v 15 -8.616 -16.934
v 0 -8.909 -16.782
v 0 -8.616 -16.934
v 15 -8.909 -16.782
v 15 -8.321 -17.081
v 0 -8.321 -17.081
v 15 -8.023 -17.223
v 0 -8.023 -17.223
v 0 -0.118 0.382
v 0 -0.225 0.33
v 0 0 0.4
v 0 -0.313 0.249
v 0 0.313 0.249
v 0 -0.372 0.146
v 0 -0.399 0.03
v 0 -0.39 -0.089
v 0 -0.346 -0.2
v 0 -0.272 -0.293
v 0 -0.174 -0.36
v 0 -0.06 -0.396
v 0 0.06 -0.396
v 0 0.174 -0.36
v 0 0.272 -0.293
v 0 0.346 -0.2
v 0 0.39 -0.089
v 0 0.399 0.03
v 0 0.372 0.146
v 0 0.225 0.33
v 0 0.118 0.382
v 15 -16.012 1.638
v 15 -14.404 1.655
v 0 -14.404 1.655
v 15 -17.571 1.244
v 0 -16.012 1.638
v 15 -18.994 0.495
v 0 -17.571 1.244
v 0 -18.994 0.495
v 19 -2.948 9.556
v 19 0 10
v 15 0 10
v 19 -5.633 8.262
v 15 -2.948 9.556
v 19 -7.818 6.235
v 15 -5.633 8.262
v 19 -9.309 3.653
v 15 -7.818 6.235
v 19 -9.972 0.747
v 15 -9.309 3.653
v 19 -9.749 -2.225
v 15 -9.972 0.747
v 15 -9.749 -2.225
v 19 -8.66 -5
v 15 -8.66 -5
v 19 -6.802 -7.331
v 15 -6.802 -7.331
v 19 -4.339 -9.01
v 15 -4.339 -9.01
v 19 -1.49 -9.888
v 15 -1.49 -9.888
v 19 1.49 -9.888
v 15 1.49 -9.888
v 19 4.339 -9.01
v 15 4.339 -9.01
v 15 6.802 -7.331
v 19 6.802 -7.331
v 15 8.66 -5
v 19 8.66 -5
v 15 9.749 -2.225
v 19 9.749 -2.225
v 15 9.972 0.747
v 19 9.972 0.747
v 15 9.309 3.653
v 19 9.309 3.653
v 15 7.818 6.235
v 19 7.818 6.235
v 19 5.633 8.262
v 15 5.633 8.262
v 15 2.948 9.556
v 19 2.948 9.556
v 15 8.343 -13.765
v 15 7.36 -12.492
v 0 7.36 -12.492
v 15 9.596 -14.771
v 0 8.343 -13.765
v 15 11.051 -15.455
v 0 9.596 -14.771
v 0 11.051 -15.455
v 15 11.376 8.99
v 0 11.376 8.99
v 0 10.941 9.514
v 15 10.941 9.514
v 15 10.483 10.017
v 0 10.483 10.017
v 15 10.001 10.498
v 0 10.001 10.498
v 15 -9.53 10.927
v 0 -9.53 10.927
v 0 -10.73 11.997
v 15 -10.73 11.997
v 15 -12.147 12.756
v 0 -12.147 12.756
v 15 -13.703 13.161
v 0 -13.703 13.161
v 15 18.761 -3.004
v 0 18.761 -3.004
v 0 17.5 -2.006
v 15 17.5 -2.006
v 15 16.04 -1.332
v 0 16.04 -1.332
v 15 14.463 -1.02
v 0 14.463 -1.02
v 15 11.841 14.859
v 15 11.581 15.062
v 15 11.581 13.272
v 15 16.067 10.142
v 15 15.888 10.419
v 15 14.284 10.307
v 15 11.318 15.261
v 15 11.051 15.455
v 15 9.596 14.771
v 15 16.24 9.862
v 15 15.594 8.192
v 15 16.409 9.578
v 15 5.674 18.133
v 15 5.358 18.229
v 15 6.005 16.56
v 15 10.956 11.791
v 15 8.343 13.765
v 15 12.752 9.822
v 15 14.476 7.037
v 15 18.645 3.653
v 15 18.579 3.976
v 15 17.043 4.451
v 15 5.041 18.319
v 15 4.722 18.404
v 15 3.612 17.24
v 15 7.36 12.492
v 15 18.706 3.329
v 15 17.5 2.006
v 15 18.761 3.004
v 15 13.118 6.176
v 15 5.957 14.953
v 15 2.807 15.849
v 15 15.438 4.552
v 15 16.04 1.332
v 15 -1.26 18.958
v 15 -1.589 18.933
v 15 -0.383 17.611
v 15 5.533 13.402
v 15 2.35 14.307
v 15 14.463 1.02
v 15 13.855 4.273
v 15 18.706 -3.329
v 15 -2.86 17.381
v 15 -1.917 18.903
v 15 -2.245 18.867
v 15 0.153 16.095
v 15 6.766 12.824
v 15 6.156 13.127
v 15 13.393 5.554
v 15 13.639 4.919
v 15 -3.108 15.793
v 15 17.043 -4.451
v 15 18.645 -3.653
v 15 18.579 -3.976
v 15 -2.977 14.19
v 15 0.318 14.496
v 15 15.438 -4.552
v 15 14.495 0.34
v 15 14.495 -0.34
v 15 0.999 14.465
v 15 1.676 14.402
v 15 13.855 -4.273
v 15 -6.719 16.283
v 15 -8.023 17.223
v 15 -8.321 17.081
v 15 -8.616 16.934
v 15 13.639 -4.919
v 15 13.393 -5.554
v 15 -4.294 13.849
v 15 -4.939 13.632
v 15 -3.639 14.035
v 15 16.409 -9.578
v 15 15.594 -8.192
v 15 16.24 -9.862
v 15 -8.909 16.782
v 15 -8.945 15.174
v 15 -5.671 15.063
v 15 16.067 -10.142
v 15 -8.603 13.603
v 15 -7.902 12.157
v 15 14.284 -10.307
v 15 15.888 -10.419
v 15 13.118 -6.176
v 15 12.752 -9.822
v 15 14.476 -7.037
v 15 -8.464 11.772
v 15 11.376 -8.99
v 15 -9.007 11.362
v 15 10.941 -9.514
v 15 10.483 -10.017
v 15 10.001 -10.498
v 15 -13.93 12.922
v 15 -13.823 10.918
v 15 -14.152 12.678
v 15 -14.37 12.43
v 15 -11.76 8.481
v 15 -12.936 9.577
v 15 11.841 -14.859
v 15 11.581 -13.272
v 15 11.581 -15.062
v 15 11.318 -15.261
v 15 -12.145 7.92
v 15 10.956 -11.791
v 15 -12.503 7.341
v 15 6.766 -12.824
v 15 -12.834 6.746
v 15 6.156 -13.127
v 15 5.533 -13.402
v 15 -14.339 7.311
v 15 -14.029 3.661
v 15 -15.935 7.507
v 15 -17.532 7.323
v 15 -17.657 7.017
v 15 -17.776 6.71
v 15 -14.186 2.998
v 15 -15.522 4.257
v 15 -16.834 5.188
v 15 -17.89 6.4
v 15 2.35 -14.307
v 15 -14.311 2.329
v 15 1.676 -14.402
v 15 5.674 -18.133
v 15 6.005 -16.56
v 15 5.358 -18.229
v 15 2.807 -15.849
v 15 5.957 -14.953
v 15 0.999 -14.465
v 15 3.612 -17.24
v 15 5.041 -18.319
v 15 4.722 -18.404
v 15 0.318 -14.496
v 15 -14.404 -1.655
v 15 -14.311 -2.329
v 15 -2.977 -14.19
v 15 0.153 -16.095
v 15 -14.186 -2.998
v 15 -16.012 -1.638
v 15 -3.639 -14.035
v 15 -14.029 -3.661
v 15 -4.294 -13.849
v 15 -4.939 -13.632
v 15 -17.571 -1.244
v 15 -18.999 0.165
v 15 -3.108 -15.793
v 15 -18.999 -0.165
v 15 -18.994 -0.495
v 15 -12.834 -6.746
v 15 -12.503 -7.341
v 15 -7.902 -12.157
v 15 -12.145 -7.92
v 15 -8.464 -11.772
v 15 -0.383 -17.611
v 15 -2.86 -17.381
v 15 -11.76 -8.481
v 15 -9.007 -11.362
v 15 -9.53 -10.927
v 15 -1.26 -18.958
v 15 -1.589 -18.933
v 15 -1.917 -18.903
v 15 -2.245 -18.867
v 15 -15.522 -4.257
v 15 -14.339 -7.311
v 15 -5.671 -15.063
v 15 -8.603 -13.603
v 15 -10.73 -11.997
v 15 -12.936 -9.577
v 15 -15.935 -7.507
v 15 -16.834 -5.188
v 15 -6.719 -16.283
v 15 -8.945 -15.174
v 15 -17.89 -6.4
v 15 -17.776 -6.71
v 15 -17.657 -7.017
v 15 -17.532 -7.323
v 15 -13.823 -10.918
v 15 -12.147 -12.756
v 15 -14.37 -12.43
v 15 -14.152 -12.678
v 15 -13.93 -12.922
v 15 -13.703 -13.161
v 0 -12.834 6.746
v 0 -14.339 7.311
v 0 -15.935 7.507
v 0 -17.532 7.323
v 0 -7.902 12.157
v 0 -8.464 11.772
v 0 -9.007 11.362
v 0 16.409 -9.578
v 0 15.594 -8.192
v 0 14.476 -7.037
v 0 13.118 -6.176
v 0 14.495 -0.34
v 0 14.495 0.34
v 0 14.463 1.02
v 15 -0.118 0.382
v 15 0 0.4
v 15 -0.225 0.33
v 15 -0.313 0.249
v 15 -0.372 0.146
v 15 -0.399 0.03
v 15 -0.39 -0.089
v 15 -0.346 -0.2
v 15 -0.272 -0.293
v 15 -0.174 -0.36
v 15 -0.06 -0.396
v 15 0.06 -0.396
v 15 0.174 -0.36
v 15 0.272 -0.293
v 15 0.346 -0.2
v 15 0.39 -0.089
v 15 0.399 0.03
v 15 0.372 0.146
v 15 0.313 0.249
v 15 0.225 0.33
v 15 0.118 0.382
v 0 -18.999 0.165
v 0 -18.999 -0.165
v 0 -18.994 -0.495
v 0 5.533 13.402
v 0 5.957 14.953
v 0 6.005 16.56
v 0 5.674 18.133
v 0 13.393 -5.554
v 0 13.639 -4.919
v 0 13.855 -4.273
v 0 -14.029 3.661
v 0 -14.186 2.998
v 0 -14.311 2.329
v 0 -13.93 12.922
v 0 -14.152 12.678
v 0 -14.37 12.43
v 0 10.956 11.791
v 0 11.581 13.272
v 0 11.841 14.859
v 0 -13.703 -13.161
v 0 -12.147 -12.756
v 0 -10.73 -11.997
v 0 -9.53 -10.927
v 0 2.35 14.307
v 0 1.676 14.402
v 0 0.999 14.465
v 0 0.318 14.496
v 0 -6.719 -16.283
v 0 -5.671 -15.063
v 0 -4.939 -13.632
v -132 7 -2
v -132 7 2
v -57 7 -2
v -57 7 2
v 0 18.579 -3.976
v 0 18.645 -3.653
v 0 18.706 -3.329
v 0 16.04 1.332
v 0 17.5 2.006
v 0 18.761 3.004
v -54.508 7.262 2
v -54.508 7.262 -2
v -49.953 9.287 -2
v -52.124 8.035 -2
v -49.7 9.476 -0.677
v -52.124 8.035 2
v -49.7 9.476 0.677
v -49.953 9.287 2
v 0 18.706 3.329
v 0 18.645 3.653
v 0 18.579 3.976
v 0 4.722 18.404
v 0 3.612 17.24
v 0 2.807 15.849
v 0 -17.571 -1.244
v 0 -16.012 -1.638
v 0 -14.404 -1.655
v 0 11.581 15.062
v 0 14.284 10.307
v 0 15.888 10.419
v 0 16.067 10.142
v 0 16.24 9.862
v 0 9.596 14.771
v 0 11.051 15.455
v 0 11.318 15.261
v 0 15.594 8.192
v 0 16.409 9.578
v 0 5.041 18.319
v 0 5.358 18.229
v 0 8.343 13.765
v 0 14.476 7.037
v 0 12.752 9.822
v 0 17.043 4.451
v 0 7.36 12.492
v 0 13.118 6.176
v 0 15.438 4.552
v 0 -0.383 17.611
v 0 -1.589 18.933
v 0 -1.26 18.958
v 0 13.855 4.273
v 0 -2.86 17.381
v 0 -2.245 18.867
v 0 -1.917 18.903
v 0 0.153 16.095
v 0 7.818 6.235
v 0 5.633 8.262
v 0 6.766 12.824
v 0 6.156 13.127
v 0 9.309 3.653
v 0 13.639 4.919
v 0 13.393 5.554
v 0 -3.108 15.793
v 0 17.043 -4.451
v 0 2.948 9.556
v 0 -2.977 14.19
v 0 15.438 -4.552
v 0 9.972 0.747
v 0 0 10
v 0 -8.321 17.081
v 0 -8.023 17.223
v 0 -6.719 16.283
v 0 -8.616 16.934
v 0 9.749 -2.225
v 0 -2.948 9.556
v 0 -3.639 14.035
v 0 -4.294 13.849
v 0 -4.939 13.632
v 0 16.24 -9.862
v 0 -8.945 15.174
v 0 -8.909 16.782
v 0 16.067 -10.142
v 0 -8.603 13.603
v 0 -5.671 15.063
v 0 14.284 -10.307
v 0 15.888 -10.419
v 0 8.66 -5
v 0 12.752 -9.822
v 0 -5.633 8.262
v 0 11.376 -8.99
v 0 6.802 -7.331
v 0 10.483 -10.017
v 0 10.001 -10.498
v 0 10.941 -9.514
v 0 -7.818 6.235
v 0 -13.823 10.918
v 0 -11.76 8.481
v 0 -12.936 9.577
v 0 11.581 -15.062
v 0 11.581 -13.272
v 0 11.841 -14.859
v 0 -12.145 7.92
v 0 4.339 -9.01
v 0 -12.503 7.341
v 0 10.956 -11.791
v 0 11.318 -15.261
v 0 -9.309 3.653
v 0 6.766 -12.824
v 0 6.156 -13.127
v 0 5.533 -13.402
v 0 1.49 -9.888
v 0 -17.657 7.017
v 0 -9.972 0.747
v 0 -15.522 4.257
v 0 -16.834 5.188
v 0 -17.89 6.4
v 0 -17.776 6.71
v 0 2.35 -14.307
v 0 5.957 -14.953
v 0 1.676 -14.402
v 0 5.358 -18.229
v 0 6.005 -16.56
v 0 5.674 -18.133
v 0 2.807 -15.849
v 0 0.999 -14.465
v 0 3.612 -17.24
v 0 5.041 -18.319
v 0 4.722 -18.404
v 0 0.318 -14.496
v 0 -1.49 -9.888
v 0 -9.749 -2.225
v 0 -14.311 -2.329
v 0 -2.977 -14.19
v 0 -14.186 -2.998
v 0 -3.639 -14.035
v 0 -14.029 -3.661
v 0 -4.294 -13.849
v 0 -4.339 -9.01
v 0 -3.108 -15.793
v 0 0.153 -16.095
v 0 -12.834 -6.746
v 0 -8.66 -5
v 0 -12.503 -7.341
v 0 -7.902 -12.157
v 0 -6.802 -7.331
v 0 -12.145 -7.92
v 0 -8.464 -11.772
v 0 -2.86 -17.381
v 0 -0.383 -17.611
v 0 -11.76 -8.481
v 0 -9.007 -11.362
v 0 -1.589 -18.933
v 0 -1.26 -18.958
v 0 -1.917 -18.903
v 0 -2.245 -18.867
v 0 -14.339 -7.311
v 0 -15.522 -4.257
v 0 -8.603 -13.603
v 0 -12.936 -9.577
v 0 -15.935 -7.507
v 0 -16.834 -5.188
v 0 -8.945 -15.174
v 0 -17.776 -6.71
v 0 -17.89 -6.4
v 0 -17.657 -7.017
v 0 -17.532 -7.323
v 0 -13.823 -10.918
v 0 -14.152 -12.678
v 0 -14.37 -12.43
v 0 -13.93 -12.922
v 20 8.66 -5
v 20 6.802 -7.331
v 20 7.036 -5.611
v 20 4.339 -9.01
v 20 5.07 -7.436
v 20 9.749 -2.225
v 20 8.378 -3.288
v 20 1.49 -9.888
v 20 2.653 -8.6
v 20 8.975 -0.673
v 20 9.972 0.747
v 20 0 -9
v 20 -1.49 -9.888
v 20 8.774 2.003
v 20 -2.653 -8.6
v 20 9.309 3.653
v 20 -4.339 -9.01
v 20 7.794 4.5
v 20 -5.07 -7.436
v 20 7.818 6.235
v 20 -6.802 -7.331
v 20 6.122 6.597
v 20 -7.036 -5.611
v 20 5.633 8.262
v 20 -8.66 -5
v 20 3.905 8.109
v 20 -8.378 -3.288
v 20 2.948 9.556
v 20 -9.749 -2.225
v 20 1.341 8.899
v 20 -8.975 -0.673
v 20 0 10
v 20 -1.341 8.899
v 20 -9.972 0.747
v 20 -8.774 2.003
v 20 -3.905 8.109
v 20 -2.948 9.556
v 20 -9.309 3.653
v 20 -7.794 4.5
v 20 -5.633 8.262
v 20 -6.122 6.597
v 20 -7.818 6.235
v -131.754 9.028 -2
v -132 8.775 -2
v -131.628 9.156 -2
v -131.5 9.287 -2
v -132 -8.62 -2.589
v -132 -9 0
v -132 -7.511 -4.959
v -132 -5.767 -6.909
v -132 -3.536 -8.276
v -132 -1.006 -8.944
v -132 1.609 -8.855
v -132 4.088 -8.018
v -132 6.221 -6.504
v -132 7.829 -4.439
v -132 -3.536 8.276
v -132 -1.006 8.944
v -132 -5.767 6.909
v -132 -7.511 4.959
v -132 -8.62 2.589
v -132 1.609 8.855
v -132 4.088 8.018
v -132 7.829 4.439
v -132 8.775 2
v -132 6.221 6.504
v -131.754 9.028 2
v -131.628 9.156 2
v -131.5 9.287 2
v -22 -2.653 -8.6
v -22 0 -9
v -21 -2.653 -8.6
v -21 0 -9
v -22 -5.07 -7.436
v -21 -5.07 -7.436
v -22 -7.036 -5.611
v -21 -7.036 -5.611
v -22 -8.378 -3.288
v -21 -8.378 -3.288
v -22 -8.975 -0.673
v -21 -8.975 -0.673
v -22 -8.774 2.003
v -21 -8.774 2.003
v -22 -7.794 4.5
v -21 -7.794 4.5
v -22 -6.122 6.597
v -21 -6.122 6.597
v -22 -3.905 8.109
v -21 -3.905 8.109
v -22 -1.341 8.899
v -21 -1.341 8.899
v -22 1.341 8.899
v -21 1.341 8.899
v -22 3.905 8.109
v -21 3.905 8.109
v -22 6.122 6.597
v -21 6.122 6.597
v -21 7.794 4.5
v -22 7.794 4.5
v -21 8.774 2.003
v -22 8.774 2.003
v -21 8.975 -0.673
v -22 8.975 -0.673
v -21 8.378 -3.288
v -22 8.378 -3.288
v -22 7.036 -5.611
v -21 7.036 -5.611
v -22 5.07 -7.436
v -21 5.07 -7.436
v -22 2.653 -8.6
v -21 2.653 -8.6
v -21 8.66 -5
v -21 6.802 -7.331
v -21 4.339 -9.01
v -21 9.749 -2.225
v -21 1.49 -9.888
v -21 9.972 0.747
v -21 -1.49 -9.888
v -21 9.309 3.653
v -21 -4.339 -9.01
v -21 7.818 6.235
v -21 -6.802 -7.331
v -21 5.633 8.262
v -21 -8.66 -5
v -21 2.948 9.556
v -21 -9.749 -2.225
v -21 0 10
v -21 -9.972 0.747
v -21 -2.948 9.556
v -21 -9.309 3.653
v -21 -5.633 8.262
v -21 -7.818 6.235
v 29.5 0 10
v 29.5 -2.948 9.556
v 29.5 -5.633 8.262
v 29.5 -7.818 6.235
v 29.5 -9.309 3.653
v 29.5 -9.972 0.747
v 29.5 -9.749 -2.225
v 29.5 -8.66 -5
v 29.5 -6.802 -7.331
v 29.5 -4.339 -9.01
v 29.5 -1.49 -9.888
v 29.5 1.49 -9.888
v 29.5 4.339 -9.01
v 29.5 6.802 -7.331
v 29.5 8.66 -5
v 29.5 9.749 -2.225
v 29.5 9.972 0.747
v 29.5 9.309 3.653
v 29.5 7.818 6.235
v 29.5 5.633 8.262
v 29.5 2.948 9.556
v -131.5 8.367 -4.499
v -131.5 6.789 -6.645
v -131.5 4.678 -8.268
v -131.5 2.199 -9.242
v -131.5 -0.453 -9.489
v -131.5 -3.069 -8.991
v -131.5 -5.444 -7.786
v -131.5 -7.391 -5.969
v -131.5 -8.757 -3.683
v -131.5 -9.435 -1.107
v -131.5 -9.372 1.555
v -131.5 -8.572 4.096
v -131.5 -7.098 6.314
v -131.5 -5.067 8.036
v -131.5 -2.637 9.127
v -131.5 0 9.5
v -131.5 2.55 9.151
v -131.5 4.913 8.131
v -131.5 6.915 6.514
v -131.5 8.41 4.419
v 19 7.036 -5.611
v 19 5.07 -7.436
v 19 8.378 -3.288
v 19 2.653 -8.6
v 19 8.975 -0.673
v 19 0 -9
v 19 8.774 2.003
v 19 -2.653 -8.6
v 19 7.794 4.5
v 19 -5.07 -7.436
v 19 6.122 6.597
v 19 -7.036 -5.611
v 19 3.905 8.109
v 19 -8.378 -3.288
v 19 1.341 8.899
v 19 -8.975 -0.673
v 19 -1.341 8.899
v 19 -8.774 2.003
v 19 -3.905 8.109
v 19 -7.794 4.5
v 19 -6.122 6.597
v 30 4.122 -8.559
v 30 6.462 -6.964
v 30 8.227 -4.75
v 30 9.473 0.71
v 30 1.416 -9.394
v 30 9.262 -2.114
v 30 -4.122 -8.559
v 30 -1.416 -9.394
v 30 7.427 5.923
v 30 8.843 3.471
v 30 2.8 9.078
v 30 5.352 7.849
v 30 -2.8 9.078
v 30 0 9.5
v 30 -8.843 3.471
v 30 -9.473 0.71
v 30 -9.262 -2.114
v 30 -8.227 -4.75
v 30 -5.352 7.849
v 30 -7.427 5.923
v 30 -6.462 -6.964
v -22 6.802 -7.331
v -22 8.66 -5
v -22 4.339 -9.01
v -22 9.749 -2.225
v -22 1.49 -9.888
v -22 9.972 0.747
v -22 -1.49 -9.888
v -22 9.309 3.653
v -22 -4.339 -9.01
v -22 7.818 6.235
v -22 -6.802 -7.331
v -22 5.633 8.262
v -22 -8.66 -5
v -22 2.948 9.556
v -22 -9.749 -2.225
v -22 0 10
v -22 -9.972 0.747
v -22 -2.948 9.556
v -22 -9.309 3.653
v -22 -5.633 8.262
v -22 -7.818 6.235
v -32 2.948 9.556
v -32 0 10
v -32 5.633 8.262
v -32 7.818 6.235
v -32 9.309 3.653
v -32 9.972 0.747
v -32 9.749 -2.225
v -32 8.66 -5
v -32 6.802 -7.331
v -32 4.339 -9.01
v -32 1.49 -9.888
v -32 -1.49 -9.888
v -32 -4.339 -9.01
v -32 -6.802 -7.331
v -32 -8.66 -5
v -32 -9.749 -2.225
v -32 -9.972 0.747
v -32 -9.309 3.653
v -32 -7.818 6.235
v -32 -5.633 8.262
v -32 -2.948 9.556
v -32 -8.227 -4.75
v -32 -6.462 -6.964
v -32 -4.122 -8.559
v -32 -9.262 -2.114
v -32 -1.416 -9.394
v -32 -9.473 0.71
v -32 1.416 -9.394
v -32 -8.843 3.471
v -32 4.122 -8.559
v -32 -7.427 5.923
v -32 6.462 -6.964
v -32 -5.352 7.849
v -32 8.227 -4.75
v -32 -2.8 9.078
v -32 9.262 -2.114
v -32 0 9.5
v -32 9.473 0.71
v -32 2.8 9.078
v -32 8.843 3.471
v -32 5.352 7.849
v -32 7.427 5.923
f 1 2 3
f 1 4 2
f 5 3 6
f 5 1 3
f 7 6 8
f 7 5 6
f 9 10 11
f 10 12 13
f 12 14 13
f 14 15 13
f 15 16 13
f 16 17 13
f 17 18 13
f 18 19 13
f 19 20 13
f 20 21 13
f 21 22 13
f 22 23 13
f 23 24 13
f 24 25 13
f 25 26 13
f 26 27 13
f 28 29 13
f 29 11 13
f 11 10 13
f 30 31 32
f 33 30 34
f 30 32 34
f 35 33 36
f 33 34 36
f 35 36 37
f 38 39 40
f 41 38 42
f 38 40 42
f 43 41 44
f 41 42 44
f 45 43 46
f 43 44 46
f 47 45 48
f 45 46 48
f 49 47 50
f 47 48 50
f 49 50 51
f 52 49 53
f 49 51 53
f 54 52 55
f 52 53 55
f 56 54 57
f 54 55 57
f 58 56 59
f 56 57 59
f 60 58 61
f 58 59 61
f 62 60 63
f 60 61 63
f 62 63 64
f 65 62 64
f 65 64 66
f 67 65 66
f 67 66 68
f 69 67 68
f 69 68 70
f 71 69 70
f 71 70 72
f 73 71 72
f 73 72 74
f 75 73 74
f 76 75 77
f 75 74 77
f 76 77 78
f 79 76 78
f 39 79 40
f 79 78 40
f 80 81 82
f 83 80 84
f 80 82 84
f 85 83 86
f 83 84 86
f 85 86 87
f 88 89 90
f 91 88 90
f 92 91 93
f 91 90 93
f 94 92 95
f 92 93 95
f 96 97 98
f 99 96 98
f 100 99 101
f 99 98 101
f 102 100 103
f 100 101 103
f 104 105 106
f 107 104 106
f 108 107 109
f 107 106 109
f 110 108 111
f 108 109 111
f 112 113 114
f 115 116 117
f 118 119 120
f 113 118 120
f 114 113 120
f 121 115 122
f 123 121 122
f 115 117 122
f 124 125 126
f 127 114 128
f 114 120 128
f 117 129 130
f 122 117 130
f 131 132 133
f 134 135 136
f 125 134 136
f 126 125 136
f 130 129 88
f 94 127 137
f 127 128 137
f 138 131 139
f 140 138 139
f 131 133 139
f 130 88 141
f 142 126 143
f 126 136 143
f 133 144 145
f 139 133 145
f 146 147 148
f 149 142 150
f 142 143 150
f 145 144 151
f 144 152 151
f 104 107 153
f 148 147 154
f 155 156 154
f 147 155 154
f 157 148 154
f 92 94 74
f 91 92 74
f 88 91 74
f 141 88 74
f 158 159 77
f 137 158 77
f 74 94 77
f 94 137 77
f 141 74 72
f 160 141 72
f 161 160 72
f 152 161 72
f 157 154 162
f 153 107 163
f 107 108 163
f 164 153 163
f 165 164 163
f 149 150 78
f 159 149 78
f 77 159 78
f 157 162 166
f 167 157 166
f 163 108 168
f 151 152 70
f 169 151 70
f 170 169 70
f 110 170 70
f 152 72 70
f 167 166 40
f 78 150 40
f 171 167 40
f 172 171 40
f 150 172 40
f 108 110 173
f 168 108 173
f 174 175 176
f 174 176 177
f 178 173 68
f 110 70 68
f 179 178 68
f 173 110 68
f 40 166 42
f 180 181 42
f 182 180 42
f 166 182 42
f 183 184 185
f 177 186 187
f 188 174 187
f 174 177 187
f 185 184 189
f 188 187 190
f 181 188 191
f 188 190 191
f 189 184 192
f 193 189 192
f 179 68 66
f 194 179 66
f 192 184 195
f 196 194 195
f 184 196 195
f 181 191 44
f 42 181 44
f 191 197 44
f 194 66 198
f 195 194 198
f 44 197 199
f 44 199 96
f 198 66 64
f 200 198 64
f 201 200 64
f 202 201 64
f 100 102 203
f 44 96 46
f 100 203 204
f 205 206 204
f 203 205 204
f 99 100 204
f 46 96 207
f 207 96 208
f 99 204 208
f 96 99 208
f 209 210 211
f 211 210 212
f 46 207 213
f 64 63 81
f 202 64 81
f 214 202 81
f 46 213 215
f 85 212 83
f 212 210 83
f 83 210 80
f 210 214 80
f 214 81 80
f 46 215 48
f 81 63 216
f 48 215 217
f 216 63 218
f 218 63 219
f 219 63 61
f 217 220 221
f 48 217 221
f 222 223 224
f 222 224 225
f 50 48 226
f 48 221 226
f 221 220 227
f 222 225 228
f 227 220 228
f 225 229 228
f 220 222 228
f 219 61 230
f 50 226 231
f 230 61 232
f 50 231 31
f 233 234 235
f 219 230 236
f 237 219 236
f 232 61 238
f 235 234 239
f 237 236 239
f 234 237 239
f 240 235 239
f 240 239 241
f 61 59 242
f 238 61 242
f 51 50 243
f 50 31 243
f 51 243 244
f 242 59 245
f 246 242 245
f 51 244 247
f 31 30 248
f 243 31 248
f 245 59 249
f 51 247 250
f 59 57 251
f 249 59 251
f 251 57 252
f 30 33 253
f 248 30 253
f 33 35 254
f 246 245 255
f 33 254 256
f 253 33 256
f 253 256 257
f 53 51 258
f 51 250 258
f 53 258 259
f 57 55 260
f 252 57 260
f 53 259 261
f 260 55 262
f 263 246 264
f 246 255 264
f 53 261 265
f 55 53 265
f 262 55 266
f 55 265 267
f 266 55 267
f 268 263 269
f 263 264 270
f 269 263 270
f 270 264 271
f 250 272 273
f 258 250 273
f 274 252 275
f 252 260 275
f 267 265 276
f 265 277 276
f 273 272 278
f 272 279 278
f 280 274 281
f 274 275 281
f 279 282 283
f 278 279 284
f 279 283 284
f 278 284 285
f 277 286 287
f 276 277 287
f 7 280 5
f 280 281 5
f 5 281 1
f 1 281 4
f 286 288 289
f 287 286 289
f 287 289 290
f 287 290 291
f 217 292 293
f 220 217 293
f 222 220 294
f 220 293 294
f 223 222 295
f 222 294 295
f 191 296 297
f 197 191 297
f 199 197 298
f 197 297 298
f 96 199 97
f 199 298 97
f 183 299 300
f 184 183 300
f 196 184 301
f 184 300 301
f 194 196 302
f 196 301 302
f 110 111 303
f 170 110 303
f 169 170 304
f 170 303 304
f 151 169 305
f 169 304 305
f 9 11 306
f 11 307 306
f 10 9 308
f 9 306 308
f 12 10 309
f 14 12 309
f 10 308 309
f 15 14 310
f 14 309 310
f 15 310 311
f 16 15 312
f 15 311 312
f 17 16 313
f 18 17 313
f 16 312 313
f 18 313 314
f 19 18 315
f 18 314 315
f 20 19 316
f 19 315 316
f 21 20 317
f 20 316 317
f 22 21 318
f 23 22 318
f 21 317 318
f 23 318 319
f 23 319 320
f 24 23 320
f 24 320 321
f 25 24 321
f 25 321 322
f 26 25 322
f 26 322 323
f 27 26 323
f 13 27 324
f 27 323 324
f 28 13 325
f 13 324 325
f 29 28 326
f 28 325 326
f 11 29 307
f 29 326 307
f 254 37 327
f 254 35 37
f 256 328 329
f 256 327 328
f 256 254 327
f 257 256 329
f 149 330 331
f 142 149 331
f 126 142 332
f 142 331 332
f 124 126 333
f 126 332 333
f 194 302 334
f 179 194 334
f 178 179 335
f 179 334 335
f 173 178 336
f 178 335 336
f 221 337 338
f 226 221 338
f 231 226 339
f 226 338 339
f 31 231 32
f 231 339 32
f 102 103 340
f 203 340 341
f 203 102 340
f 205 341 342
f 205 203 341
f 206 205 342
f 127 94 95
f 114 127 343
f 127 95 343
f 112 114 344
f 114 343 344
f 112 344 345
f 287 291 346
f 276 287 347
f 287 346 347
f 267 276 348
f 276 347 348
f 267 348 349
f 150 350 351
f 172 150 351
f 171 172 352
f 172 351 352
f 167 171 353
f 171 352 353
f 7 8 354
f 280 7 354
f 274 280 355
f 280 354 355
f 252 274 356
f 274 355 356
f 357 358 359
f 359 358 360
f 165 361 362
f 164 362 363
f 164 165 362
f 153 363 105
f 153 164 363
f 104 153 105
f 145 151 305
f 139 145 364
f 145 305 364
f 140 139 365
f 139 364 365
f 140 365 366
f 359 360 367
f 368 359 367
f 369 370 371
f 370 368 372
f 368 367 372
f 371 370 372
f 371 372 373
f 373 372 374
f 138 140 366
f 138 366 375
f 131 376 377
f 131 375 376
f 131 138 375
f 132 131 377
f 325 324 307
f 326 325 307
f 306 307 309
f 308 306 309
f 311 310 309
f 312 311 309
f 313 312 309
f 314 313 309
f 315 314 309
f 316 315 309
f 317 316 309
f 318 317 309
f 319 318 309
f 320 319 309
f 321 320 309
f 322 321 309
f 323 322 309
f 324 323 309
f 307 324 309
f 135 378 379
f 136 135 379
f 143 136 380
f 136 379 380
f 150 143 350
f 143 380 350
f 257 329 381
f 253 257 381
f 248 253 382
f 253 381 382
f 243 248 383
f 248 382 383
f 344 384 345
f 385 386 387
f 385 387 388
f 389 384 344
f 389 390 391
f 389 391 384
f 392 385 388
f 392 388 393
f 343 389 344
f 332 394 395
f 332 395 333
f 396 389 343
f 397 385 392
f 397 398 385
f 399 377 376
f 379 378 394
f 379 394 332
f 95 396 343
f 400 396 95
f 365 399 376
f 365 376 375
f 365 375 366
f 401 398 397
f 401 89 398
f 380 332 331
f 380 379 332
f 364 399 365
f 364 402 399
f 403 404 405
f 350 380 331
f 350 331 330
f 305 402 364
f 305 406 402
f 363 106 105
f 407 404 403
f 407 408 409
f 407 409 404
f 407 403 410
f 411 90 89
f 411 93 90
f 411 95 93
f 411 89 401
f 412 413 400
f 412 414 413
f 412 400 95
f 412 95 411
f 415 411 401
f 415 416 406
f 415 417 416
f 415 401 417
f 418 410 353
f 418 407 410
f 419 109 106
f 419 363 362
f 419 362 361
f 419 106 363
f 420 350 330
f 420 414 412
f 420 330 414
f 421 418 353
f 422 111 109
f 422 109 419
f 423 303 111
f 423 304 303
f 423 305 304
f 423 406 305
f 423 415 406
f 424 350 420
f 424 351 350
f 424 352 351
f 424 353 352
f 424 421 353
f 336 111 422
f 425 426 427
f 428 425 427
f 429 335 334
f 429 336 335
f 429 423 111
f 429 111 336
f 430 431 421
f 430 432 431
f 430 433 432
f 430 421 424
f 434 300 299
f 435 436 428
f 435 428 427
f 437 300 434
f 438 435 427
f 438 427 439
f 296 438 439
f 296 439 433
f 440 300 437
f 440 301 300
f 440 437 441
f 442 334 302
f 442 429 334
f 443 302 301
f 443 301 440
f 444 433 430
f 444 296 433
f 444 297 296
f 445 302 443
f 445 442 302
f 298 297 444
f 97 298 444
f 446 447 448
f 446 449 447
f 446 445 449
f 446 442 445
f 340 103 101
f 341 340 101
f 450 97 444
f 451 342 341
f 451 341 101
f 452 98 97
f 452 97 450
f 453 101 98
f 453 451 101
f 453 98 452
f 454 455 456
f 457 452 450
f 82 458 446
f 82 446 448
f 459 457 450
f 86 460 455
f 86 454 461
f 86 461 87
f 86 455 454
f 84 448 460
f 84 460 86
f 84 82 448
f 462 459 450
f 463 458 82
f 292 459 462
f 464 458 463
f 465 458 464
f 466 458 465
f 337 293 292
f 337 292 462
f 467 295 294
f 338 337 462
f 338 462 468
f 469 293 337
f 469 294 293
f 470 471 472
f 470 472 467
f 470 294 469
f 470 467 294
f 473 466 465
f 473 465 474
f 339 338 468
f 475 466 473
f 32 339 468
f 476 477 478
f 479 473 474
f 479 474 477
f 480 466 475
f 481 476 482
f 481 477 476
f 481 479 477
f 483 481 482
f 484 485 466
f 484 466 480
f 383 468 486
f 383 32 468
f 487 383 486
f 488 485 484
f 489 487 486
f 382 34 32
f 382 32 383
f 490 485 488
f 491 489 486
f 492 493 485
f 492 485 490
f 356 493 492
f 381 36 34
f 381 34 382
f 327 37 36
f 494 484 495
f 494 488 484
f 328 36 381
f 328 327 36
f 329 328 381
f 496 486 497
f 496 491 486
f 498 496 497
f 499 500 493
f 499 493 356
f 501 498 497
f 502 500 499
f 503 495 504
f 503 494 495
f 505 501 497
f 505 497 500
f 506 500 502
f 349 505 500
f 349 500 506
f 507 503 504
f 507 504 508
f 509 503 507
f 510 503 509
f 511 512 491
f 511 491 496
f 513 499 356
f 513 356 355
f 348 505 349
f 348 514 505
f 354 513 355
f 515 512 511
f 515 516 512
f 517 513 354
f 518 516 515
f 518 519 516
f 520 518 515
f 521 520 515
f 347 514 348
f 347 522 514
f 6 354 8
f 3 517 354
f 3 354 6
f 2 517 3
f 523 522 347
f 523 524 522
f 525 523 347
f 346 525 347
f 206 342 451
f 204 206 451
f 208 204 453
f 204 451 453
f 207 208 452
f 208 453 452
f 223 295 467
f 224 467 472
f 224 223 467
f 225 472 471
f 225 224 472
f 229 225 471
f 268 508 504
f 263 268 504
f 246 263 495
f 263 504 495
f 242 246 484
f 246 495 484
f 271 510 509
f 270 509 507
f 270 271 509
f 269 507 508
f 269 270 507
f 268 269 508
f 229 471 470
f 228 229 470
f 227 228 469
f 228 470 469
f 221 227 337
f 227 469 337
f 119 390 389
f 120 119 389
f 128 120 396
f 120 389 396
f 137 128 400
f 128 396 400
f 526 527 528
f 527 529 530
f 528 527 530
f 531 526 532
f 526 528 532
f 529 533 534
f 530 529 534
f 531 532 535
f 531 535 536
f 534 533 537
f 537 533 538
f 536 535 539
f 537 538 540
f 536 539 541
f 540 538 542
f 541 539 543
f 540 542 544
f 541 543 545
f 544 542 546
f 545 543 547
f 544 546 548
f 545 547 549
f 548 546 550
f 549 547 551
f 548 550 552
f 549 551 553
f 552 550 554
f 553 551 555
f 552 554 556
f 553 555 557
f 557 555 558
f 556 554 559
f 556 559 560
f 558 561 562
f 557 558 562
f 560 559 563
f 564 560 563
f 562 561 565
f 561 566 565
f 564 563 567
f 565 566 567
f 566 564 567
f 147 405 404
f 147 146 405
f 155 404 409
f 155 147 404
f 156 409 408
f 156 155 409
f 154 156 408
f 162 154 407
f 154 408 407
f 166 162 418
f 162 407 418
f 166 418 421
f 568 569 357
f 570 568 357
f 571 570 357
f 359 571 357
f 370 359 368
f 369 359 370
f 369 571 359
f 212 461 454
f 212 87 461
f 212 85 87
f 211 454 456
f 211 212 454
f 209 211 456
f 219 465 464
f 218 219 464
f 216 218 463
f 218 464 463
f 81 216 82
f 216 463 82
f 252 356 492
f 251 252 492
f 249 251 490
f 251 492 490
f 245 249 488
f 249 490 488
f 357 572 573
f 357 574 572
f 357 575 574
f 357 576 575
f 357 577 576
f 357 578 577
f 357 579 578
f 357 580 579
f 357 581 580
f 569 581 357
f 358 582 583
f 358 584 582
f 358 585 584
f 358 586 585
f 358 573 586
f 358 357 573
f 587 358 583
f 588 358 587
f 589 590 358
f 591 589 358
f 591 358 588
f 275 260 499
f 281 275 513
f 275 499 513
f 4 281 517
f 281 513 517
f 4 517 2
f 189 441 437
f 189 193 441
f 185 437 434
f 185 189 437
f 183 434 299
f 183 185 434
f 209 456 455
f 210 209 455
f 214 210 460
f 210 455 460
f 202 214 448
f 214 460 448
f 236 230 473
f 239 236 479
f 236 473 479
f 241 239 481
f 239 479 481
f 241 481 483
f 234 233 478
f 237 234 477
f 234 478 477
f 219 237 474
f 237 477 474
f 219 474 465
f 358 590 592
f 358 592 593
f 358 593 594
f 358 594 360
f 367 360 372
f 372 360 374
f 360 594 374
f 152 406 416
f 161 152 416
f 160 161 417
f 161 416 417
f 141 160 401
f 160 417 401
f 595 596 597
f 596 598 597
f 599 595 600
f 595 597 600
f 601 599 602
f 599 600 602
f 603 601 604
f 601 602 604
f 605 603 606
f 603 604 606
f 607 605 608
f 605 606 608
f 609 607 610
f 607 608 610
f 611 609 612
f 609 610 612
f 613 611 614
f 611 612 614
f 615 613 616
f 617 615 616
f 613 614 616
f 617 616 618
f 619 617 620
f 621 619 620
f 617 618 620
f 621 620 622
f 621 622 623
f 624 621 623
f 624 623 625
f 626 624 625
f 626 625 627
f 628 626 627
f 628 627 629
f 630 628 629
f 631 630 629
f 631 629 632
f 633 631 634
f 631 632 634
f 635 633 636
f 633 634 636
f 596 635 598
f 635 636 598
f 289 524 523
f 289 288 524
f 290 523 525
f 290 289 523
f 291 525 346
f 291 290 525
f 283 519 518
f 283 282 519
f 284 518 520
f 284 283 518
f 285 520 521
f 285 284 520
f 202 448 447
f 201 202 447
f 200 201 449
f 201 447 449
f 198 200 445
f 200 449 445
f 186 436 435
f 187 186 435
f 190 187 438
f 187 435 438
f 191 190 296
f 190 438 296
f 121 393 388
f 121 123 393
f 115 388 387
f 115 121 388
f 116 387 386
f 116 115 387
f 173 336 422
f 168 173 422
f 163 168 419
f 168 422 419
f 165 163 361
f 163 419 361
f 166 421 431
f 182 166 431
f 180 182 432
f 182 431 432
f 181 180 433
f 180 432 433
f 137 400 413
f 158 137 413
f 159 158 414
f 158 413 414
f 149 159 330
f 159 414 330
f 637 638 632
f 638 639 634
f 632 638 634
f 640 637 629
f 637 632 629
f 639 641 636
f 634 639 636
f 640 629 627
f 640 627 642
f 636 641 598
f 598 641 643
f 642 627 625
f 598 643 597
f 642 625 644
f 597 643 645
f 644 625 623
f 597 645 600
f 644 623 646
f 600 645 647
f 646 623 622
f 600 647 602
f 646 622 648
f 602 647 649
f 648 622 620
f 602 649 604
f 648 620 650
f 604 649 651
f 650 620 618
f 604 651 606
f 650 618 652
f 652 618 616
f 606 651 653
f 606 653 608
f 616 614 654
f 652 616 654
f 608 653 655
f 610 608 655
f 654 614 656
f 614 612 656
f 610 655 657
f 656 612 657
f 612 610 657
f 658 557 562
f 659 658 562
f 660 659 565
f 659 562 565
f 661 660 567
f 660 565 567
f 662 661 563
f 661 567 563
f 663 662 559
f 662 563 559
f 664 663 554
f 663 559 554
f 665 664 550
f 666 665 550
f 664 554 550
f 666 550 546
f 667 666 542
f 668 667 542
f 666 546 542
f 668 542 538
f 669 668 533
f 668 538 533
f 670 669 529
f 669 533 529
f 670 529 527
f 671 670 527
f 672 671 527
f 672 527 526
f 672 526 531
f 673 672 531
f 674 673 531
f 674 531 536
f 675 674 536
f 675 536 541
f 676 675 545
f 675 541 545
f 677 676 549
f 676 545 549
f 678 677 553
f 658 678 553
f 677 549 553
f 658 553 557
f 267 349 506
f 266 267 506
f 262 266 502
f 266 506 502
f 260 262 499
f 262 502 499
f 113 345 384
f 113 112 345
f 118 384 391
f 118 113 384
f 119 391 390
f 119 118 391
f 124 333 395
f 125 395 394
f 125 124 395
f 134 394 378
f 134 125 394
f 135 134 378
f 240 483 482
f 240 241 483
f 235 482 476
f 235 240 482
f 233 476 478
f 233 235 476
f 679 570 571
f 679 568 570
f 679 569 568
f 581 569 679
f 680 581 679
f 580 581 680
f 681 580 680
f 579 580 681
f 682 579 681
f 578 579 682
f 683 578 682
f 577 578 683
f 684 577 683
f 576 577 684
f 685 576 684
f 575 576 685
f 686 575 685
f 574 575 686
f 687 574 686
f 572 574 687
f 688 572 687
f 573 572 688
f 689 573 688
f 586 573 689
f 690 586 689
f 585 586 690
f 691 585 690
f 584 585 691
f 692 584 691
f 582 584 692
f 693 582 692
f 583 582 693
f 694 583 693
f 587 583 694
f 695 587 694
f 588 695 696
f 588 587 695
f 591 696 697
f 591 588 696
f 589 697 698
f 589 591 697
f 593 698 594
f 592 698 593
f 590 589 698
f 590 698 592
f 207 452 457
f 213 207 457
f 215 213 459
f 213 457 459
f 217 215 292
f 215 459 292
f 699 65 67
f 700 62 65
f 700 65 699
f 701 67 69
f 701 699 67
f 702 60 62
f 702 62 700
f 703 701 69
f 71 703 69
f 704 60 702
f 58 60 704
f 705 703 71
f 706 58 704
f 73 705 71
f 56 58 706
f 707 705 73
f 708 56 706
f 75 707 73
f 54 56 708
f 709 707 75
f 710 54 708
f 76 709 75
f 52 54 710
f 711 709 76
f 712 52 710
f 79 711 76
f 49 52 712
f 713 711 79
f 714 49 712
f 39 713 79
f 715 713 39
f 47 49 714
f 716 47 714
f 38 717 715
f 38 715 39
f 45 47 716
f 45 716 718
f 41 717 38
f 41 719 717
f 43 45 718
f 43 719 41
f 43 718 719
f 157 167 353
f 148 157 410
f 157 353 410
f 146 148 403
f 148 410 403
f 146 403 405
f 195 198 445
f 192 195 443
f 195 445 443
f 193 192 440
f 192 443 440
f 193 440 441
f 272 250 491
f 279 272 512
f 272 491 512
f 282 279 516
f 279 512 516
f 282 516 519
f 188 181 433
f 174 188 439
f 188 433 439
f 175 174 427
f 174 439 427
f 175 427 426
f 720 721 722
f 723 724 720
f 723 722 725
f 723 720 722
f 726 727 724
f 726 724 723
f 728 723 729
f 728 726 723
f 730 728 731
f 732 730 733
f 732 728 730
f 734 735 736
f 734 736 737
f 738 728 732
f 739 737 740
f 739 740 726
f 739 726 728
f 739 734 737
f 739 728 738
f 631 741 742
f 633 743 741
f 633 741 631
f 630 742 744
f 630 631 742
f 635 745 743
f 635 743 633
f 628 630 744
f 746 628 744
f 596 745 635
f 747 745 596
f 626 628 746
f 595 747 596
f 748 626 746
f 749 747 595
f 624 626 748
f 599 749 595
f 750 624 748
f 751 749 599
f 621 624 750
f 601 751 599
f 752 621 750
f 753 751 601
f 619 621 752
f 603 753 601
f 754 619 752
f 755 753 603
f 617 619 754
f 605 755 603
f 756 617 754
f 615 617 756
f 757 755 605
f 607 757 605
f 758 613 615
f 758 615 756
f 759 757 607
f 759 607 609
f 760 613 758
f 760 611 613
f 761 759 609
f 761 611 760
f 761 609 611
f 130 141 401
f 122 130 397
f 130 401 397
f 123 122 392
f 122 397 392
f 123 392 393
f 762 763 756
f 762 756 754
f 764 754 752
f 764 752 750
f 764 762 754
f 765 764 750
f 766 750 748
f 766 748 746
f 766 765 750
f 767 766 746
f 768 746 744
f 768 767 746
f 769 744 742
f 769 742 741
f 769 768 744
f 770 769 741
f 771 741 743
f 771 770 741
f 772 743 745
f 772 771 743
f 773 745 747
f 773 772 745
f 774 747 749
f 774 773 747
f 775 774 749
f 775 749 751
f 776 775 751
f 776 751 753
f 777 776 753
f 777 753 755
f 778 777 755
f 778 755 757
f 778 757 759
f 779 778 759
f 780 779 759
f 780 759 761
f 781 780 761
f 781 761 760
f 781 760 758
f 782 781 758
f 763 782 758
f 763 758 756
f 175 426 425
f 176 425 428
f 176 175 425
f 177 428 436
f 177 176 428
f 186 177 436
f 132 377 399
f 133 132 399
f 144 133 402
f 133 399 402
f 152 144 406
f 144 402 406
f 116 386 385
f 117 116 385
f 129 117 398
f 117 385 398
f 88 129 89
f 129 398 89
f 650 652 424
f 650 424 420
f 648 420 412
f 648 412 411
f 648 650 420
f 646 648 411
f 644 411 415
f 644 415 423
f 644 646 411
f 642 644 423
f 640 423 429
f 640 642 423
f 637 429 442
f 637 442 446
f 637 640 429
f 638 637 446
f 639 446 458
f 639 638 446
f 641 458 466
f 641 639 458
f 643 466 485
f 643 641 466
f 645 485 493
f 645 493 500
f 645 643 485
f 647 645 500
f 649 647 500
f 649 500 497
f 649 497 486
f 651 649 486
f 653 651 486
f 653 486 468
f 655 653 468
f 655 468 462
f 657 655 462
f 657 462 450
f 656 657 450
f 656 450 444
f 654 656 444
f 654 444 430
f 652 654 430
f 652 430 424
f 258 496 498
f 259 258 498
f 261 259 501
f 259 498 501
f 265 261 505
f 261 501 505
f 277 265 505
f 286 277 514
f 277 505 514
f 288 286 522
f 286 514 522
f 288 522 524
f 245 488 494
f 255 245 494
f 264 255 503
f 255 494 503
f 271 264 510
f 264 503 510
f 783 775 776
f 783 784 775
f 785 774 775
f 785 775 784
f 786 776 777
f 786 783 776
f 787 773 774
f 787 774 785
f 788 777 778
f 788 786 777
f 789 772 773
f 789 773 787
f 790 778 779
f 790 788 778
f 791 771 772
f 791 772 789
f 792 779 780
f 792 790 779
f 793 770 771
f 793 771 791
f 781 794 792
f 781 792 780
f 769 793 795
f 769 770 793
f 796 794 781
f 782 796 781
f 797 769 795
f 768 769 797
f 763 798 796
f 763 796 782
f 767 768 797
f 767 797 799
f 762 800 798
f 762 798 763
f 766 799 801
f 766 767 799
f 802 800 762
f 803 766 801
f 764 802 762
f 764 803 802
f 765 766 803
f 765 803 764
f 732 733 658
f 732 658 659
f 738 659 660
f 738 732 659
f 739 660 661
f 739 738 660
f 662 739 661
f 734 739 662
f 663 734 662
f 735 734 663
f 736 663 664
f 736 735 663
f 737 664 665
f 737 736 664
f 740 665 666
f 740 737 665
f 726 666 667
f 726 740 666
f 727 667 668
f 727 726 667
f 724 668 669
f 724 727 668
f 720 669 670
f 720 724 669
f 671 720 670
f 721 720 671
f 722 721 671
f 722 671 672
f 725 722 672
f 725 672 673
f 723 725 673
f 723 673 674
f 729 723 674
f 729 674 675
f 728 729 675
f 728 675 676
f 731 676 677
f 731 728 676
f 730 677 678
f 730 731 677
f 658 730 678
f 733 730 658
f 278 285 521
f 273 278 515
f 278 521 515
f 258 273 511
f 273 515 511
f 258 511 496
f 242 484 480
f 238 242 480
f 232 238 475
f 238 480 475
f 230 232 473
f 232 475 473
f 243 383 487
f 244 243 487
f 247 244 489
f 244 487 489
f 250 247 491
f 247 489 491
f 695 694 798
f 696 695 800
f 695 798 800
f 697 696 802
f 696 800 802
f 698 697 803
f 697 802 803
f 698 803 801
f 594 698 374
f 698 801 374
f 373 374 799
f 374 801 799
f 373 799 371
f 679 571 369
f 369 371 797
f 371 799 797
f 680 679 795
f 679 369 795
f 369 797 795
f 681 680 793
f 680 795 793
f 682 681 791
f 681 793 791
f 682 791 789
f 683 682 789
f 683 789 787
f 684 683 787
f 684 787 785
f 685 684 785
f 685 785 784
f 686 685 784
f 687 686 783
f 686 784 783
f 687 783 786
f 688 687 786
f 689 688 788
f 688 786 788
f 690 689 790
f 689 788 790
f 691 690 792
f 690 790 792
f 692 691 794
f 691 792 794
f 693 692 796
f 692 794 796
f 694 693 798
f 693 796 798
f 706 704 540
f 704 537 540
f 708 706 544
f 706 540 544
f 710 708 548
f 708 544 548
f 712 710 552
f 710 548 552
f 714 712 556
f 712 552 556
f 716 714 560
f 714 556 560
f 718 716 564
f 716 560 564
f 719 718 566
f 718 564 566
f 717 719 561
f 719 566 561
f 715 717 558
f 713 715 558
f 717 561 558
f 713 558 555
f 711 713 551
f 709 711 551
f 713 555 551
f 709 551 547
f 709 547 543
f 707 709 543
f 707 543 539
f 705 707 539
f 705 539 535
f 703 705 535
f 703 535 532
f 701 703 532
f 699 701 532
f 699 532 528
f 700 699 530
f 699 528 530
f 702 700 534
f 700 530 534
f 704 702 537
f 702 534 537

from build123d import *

# Parameters (mm, degrees)
BASPROSKE_W         = 15
BASPROSKE_H         = 19
TOOTHCUT_DEPTH      = 31.773365107
TEETHCUTS_COUNT     = 17
TEETHCUTS_ANGLE     = 338.823529412
BORSKE_R            = 0.4
BORE_DEPTH          = 50.0000508
SKETCH1_R           = 10
BOSS_EXTRUDE1_DEPTH = 15
BOSS_EXTRUDE2_START = 32
SKETCH2_R           = 10
BOSS_EXTRUDE2_DEPTH = 32
BOSS_EXTRUDE3_START = 32
SKETCH2_3_R         = 9.5
BOSS_EXTRUDE3_DEPTH = 100
CUT_EXTRUDE1_DEPTH  = 2
SKETCH4_W           = 1
SKETCH4_H           = 1
CHAMFER1_SIZE       = 0.5


with BuildPart() as part:
    # BasProSke → Base-Revolve (revolve)
    with BuildSketch(Plane(origin=(0, 0, 0), x_dir=(1, 0, 0), z_dir=(0, 1, 0)), mode=Mode.PRIVATE) as base_revolve_sk:
        with Locations((7.5, 9.5)):
            Rectangle(BASPROSKE_W, BASPROSKE_H)
    revolve(base_revolve_sk.sketch.rotate(Axis((-10, 0, 0), (1, 0, 0)), 180), axis=Axis((-10, 0, 0), (1, 0, 0)))

    # TooCutSke → ToothCut (cut, through all)
    with BuildSketch(Plane(origin=(0, 0, 0), x_dir=(0, 0, -1), z_dir=(1, 0, 0))):
        with BuildLine():
            ThreePointArc((1.020352389, 14.463052306), (0, 14.499), (-1.020352389, 14.463052306))
            ThreePointArc((-1.020352389, 14.463052306), (-1.632621885, 16.804485203), (-3.026143023, 18.783192049))
            ThreePointArc((-3.026143023, 18.783192049), (0, 19.0254), (3.026143023, 18.783192049))
            ThreePointArc((3.026143023, 18.783192049), (1.632621885, 16.804485203), (1.020352389, 14.463052306))
        make_face()
    toothcut = extrude(amount=TOOTHCUT_DEPTH, mode=Mode.SUBTRACT)

    # TeethCuts: ToothCut ×17 about axis
    teethcuts_axis = Axis((-10, 0, 0), (1, 0, 0))
    for i in range(1, TEETHCUTS_COUNT):
        add(toothcut.rotate(teethcuts_axis, i * TEETHCUTS_ANGLE / (TEETHCUTS_COUNT - 1)), mode=Mode.SUBTRACT)

    # BorSke → Bore (cut, symmetric)
    with BuildSketch(Plane(origin=(0, 0, 0), x_dir=(0, 0, -1), z_dir=(1, 0, 0))):
        with Locations(Location((0, 0, 0), (0, 0, 180))):
            Circle(BORSKE_R)
    extrude(amount=BORE_DEPTH, both=True, mode=Mode.SUBTRACT)

    # Sketch1 → Boss-Extrude1 (add)
    with BuildSketch(Plane(origin=(15, 0, 0), x_dir=(0, 0, -1), z_dir=(1, 0, 0))):
        with Locations(Location((0, 0, 0), (0, 0, 180))):
            Circle(SKETCH1_R)
    extrude(amount=BOSS_EXTRUDE1_DEPTH)

    # Sketch2 → Boss-Extrude2 (add)
    with BuildSketch(Plane.ZY.offset(BOSS_EXTRUDE2_START)):
        Circle(SKETCH2_R)
    extrude(amount=-BOSS_EXTRUDE2_DEPTH)

    # Sketch2<3> → Boss-Extrude3 (add)
    with BuildSketch(Plane.ZY.offset(BOSS_EXTRUDE3_START)):
        Circle(SKETCH2_3_R)
    extrude(amount=BOSS_EXTRUDE3_DEPTH)

    # Sketch3 → Cut-Extrude1 (cut, symmetric)
    with BuildSketch(Plane.XY):
        with BuildLine():
            Line((-132, 9.5), (-132, 7))
            Line((-132, 7), (-57, 7))
            ThreePointArc((-57, 7), (-53.127016654, 7.642183308), (-49.668560851, 9.5))
            Line((-49.668560851, 9.5), (-132, 9.5))
        make_face()
    extrude(amount=CUT_EXTRUDE1_DEPTH, both=True, mode=Mode.SUBTRACT)

    # Sketch4 → Cut-Revolve1 (revolve, cut)
    with BuildSketch(Plane.XY, mode=Mode.PRIVATE) as cut_revolve1_sk:
        with Locations((19.5, 9.5)):
            Rectangle(SKETCH4_W, SKETCH4_H)
        with Locations((-21.5, 9.5)):
            Rectangle(SKETCH4_W, SKETCH4_H)
    revolve(cut_revolve1_sk.sketch.rotate(Axis((0, 0, 0), (-1, 0, 0)), 90), axis=Axis((0, 0, 0), (-1, 0, 0)), mode=Mode.SUBTRACT)

    # Chamfer1
    chamfer1_edges = [part.edges().sort_by_distance(p)[0] for p in [
        (30, 0, -10),
        (-132, -7.39087275, -5.968668193),
    ]]
    chamfer(chamfer1_edges, length=CHAMFER1_SIZE)


solid = part.part
